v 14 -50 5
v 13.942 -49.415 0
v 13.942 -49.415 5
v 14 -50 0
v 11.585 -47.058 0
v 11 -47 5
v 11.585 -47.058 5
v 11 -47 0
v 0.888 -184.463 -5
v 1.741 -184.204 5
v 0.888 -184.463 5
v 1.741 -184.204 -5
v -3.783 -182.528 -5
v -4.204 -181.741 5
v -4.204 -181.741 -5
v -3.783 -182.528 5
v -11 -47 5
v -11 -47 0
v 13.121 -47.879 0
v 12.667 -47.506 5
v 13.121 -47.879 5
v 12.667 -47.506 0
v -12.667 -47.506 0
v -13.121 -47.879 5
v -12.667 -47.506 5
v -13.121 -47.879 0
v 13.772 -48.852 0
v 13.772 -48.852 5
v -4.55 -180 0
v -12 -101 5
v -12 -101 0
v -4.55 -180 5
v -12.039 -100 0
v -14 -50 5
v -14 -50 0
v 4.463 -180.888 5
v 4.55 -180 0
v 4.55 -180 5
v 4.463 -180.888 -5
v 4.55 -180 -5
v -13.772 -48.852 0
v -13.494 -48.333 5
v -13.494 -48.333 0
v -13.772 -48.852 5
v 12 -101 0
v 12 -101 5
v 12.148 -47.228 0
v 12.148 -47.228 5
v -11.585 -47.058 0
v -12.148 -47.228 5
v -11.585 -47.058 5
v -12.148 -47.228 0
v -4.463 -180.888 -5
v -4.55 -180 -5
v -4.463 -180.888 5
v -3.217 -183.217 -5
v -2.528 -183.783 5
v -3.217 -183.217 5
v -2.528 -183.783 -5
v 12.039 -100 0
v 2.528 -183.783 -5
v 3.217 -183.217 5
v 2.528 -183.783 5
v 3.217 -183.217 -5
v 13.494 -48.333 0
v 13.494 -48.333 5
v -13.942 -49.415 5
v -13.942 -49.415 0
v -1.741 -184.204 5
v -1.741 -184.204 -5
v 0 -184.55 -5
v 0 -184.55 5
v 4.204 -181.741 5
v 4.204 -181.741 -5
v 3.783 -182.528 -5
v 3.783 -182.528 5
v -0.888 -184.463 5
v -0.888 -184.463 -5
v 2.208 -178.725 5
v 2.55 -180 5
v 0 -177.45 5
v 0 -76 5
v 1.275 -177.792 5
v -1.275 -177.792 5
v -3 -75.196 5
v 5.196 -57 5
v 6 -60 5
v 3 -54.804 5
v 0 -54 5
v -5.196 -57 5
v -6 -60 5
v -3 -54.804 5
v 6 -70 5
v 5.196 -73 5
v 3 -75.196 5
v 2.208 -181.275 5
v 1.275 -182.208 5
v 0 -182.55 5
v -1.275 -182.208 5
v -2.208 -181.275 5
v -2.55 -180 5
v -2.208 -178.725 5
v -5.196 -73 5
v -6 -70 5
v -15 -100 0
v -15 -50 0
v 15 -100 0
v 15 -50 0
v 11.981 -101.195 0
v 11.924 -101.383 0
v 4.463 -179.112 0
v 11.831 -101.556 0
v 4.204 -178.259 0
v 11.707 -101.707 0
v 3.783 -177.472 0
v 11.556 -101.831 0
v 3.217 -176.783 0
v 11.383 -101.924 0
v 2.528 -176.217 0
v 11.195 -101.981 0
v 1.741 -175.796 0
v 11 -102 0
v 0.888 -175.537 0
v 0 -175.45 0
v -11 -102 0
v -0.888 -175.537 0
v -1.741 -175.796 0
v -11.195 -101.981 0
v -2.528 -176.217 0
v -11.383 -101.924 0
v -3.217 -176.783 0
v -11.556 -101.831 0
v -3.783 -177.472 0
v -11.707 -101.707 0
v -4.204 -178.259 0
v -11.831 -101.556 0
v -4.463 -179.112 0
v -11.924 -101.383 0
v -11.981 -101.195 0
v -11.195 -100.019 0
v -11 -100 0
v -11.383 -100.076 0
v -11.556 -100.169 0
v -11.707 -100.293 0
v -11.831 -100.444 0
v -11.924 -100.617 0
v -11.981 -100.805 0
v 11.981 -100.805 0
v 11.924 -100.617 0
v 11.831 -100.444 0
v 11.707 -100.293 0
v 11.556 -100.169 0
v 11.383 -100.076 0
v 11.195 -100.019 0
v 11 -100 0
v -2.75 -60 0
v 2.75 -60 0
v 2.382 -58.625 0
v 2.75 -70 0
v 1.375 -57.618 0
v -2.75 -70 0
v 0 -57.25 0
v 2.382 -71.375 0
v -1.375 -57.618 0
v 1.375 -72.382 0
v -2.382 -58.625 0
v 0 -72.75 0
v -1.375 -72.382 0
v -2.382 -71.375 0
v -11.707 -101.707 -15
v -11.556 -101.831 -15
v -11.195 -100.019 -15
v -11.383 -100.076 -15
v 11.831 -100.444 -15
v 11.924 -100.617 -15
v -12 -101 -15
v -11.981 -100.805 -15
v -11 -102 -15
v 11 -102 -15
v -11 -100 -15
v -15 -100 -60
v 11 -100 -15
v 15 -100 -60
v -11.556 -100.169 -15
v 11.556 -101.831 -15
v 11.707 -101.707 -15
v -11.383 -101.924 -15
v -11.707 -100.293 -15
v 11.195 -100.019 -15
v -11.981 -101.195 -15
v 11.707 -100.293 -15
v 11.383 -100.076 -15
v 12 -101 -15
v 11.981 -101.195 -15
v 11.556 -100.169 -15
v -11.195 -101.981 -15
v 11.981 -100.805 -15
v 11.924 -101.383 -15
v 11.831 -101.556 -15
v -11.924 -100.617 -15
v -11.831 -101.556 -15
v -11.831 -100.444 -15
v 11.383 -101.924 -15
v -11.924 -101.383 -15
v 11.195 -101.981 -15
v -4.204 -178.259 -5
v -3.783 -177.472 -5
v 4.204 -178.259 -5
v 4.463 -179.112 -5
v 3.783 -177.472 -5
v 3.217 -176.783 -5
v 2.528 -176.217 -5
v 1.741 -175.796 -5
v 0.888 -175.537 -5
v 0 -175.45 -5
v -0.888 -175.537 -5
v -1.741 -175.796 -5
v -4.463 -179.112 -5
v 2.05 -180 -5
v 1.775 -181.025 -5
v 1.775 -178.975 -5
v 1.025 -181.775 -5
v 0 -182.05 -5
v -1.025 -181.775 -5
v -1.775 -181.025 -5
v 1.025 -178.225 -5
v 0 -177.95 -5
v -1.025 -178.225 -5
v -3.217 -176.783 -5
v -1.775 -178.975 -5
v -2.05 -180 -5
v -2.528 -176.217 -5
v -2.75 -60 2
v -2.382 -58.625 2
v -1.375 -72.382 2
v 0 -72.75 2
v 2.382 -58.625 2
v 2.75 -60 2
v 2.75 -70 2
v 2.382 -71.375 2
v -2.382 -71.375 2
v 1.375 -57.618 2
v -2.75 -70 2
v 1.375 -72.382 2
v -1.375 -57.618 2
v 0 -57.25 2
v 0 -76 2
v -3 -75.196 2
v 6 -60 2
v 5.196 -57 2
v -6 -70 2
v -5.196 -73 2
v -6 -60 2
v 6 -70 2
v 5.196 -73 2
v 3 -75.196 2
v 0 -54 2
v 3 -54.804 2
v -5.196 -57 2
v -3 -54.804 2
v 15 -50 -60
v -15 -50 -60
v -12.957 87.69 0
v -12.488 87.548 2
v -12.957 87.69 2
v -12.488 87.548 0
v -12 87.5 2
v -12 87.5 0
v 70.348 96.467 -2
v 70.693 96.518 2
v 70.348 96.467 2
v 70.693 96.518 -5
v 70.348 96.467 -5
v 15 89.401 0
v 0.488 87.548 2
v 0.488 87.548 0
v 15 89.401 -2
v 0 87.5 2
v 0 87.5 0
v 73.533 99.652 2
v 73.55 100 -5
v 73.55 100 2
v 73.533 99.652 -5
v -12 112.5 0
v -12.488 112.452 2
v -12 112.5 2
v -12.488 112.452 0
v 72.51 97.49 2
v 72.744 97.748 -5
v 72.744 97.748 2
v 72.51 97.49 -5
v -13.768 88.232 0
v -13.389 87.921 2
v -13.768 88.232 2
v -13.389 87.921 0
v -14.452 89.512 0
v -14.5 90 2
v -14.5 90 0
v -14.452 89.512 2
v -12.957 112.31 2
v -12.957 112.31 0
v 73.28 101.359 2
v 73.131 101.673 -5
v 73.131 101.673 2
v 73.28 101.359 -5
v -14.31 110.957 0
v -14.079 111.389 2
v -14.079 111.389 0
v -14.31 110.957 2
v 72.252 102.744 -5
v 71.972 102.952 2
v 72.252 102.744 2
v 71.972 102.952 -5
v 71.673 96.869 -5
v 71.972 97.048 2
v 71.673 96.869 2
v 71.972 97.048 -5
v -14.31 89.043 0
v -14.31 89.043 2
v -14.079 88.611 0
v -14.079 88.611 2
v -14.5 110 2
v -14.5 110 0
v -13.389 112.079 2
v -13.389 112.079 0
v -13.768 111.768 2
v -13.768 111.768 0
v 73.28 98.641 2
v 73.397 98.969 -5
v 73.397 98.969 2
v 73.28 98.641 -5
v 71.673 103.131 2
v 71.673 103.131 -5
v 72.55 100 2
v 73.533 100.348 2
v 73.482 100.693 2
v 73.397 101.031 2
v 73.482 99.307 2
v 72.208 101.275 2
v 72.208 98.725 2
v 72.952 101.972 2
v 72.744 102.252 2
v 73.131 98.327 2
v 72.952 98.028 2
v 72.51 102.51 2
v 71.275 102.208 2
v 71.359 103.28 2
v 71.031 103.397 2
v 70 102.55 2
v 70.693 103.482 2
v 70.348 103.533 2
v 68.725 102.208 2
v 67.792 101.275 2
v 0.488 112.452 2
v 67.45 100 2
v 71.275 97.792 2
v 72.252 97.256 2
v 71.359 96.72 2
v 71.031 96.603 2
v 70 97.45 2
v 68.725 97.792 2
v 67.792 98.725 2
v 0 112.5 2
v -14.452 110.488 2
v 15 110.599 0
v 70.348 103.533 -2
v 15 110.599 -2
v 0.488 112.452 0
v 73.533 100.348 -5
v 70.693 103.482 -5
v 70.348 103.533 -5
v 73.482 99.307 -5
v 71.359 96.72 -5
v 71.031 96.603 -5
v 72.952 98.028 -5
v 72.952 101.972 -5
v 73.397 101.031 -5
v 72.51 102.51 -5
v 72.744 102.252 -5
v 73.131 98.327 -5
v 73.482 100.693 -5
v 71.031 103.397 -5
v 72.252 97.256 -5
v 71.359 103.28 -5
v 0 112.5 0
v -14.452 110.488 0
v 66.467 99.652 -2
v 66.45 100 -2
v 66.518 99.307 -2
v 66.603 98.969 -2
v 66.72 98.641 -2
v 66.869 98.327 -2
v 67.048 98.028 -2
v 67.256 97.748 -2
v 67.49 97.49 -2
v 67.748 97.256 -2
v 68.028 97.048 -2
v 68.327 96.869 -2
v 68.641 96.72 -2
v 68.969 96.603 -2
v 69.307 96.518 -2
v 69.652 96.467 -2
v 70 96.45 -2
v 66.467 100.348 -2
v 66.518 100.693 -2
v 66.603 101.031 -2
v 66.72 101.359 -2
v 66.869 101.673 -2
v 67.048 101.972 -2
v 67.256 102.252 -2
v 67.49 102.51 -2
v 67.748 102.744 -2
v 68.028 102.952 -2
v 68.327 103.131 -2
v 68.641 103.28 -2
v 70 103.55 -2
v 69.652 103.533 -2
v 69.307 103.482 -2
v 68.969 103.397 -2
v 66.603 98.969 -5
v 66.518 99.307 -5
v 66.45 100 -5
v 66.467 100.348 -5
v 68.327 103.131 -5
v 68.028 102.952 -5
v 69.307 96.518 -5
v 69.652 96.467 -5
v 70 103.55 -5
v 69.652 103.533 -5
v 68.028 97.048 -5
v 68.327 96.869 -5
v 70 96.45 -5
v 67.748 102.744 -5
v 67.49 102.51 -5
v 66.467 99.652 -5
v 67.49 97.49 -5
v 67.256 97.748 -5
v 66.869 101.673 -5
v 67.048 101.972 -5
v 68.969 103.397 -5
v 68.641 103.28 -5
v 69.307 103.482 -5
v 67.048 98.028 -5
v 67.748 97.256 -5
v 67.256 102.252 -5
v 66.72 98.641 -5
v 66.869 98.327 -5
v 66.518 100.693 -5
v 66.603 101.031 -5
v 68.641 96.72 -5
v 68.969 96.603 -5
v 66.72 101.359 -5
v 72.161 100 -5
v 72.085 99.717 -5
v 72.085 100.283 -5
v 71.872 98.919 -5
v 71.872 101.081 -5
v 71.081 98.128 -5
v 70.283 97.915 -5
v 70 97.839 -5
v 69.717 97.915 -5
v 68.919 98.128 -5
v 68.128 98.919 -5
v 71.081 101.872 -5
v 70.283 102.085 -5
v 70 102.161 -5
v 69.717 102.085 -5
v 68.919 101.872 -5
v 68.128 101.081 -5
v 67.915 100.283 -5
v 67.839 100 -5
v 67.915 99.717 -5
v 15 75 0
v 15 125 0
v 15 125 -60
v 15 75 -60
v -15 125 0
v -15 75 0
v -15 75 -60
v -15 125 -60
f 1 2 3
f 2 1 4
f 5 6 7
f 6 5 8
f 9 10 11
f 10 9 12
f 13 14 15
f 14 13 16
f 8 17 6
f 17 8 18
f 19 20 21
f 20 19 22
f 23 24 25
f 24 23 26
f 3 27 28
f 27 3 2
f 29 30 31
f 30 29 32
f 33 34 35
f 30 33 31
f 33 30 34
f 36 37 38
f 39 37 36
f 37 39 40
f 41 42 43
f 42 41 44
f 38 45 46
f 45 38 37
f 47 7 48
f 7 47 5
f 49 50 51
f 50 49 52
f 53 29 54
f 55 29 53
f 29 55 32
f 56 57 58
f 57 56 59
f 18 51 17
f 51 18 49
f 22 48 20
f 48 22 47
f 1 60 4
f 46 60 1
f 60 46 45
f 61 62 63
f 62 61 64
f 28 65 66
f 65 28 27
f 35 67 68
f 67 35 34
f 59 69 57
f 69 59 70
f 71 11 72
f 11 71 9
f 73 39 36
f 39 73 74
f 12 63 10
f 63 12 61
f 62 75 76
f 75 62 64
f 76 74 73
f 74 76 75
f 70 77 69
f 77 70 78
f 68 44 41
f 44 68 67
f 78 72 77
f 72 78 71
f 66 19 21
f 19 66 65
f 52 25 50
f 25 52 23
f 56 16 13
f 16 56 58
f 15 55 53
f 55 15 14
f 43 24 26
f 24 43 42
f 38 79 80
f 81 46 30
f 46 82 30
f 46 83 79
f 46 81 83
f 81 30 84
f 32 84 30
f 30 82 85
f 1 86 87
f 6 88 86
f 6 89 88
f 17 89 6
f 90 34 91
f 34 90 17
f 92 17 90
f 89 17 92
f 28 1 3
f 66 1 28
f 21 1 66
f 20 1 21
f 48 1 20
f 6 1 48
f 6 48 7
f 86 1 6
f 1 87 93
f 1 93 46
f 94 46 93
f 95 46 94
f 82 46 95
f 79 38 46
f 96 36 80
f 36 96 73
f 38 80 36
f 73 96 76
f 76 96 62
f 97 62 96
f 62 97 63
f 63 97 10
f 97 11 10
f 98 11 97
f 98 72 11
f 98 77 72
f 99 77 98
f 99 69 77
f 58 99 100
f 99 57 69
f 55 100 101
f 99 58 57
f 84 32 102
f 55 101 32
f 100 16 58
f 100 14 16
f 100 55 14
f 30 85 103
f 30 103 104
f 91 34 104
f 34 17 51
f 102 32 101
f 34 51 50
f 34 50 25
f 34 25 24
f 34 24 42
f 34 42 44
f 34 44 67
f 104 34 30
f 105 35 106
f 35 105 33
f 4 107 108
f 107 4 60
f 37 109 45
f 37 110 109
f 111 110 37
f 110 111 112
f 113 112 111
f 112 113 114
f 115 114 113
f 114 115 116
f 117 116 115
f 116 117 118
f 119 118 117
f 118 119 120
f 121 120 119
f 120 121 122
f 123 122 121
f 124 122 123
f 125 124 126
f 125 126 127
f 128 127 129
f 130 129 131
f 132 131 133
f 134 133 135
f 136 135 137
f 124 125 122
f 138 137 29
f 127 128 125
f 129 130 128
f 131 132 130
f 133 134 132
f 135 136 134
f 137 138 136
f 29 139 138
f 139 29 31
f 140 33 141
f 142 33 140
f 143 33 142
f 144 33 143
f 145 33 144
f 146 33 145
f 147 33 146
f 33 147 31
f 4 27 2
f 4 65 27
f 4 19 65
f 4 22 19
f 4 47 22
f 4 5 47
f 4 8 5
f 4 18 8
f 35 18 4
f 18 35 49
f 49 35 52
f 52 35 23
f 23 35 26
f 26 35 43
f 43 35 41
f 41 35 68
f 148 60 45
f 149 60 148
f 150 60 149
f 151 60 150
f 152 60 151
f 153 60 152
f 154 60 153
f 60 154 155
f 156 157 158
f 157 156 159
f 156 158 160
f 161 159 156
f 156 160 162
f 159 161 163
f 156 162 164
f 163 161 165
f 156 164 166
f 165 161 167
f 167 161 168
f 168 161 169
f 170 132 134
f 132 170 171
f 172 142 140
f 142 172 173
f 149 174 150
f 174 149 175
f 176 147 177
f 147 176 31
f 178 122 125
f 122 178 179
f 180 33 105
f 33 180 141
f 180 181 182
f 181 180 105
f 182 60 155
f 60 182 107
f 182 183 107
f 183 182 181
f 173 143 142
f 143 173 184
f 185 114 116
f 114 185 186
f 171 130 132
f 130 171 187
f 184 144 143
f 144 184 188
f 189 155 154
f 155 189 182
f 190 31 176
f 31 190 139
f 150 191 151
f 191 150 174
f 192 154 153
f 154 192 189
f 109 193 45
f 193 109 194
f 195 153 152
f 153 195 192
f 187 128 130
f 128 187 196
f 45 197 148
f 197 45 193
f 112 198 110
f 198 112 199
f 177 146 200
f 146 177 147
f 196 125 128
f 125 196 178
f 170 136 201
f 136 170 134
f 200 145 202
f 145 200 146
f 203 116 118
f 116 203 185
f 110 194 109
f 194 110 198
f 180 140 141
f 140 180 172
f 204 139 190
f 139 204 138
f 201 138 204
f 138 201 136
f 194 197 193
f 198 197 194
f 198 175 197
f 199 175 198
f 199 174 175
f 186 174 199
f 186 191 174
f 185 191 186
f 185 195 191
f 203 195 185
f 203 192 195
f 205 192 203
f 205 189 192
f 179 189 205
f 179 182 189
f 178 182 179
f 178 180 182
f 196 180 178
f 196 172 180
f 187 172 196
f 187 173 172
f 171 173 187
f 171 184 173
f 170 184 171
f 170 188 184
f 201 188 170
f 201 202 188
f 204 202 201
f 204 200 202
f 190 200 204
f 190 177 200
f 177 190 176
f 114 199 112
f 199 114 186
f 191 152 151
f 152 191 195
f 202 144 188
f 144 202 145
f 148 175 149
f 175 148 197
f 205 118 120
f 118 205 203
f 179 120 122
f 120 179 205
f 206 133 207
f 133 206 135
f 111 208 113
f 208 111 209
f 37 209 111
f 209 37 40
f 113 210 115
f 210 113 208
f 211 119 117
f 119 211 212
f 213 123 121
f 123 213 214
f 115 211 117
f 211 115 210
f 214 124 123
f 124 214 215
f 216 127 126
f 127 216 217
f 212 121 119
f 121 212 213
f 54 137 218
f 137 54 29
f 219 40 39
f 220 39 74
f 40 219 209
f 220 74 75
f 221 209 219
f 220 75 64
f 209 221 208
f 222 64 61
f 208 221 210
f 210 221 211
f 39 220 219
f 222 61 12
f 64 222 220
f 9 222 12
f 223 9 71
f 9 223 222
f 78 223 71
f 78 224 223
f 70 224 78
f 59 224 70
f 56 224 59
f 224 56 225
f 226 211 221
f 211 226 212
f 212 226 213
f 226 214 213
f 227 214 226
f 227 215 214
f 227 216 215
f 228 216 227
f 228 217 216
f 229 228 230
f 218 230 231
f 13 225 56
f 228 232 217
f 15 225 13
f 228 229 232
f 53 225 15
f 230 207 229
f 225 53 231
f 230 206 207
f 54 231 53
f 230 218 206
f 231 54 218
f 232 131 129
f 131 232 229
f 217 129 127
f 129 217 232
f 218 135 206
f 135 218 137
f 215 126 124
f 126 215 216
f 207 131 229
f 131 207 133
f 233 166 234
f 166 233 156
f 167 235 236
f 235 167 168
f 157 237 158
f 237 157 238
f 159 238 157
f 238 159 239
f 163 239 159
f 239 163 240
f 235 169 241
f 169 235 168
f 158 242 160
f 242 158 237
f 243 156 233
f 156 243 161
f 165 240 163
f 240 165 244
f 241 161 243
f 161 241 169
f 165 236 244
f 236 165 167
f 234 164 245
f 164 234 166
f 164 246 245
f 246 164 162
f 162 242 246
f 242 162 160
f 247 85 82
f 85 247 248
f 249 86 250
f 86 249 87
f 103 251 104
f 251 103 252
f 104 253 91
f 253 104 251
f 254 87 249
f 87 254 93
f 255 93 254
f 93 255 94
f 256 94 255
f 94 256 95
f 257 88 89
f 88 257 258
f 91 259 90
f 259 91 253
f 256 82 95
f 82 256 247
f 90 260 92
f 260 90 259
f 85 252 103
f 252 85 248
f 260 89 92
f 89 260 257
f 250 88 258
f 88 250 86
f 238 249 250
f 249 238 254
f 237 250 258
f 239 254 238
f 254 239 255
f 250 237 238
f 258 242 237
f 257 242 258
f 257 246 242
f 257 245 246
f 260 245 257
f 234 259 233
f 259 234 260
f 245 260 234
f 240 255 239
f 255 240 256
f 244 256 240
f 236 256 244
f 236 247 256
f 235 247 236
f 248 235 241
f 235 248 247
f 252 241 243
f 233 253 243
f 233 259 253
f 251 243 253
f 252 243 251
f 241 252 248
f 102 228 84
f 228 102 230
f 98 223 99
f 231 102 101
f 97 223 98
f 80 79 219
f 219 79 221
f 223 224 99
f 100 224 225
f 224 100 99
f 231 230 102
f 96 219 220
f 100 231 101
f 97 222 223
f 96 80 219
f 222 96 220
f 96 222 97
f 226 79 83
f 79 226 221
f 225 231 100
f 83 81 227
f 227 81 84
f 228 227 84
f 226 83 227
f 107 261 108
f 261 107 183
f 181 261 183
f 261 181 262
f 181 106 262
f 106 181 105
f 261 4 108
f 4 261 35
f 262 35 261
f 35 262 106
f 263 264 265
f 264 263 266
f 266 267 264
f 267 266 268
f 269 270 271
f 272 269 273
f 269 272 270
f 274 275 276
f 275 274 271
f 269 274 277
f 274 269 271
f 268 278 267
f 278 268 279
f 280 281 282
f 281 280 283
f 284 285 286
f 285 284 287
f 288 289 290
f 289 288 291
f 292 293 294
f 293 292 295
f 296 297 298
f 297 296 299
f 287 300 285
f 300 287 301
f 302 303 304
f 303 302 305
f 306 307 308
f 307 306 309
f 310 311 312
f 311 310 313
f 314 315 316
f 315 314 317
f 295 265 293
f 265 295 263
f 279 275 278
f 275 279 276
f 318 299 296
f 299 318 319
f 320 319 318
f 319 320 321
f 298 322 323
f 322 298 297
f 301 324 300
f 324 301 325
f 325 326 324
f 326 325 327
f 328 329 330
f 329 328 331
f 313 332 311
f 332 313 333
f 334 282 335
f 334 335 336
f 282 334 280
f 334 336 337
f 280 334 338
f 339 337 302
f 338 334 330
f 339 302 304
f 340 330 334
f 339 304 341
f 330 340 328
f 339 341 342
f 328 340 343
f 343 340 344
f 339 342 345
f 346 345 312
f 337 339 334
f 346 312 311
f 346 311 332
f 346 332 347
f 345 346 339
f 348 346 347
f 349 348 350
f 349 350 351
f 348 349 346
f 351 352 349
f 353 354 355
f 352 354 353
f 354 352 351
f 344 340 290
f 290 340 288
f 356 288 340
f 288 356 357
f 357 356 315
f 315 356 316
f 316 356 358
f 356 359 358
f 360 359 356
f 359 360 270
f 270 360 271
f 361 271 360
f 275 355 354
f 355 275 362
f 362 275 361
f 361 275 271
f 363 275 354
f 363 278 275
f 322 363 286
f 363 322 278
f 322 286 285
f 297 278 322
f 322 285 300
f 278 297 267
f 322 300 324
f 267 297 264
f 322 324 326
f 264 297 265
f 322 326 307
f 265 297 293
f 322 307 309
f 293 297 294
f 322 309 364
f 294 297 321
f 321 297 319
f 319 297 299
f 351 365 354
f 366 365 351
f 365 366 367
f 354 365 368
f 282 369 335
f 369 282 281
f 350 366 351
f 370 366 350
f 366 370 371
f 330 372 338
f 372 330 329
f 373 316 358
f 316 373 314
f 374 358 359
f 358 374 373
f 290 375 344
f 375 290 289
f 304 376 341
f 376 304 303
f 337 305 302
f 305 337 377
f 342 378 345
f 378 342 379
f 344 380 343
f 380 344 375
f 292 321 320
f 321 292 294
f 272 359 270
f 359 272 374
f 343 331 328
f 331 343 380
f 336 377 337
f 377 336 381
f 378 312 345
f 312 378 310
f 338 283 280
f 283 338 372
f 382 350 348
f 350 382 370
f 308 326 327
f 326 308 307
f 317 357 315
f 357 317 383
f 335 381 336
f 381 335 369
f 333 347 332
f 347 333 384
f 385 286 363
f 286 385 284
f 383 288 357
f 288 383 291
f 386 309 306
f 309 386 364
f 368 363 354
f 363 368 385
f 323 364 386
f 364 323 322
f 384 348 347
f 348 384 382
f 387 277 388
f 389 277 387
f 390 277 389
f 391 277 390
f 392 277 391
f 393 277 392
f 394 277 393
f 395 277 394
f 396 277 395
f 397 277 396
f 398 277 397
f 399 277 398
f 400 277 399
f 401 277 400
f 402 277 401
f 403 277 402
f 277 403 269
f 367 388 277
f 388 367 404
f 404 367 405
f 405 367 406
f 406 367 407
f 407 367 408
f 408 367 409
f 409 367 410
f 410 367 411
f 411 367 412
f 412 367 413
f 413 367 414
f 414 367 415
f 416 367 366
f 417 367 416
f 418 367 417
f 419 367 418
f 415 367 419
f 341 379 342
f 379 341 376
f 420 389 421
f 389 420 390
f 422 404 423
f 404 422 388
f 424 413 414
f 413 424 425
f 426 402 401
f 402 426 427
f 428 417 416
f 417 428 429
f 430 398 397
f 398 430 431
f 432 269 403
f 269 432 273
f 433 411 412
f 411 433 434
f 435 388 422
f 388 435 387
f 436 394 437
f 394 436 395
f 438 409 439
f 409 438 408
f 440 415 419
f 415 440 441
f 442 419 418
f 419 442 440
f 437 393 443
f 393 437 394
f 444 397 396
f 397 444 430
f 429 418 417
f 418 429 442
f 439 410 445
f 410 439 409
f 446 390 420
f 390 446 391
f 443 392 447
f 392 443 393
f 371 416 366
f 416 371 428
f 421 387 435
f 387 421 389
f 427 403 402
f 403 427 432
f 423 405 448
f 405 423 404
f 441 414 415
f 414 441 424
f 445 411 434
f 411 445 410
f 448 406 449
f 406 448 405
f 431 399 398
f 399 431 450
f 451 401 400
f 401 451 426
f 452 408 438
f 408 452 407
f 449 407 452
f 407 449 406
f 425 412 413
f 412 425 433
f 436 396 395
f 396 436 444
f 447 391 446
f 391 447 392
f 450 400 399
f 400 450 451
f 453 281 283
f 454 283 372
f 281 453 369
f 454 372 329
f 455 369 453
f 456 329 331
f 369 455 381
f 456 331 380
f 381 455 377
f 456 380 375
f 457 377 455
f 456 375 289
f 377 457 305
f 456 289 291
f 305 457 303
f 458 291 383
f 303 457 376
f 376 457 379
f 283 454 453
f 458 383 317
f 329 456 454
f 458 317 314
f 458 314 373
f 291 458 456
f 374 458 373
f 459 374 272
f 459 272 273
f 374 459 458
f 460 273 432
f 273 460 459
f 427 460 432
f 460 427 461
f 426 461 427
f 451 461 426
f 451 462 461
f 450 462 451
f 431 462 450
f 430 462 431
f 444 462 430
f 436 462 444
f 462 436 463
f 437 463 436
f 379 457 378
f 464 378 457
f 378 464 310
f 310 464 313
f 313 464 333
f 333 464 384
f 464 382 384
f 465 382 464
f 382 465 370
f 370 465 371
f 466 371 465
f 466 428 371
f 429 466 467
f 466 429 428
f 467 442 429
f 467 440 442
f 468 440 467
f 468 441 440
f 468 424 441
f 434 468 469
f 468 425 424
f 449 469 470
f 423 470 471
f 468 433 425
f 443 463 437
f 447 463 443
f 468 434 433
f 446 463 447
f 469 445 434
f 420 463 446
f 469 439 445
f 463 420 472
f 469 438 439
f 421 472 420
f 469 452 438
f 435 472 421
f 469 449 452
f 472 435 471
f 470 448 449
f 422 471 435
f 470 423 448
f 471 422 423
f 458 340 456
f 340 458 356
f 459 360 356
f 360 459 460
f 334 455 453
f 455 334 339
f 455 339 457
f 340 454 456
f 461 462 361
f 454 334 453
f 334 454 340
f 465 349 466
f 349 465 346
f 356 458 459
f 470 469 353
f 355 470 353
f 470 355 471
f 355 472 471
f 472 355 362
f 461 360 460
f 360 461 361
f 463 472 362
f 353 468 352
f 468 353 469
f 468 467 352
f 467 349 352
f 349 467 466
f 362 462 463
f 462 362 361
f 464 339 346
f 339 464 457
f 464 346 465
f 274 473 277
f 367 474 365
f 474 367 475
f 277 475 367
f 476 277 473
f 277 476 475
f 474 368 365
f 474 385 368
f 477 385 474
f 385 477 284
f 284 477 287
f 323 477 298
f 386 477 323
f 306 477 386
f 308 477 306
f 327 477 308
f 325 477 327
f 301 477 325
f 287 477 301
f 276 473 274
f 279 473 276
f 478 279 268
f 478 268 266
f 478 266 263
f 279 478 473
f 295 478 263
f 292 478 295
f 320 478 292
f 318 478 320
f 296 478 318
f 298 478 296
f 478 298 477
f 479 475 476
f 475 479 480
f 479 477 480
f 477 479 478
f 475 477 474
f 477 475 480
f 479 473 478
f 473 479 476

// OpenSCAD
echo(version=version());

bolt_diam = 5.5;
washer_diam = 12;
ptfe_diam = 4.1; //outer diam
poly = 32; // $fn value, higher is smoother
blue_x = 22; //top part width
hole_y = 20; //right part, rectangle hole
hole_x = 3;
hole_z = 15;
thi = 5; // left thickness, 4
thi2 = 4; // right thickness, 2
left_arm_dist = -80;
right_arm_dist = 80;

hexcut = 0;

case = 3; // 1 left, 2 right, 3 both, 4 print, 5 hex pattern
ptfe = 0;

module rod(x,y,diam,height,p=poly) {
	translate([x,y,-height/2])
		cylinder(h=height, d=diam, center=true, $fn=p);
}

module rod2(x,y,diam,diam2,height,p=poly) {
	translate([x,y,-height/2])
		cylinder(h=height, d1=diam, d2=diam2, center=true, $fn=p);
}

module left() {
	difference() { //diff
		//frame
		union() {
			translate([0,0,thi])
			hull(){
				rod(blue_x/2,50,6,thi, 32);
				rod(-blue_x/2,50,6,thi, 32);
				rod(blue_x/2,-1,2,thi, 32);
				rod(-blue_x/2,-1,2,thi, 32);
				
				rod(0,left_arm_dist,ptfe_diam+5,thi,32); //ptfe
			}
			translate([0,0,thi]) hull() {
				rod(blue_x/2,-1,2,20, 32);
				rod(-blue_x/2,-1,2,20, 32);
			}
			translate([0,0,thi])
				rod(0,left_arm_dist,ptfe_diam+5,thi*2,32); //ptfe
		}
		// holes:
		color("olive") union() {
			translate([0,0,5])
			hull() {
				rod(0,30,bolt_diam,10, 12);
				rod(0,40,bolt_diam,10, 12);
			}
			translate([0,0,12])
			hull() {
				rod(0,30,washer_diam,10, 12);
				rod(0,40,washer_diam,10, 12);
			}
			translate([0,0,thi])
				rod2(0,left_arm_dist,ptfe_diam,ptfe_diam+1,thi*2,12); //ptfe
			if(hexcut == 1) {
				hex(0,left_arm_dist*0.5,0,4,3,30);
				hex(0,12,0,8,6,30);
				//hex(0,-30,0,4,3,0);
				translate([0,0,-7]) rotate([90,0,0]) hex(0,0,0,5,4,30);
			}
		}
	}
	
}


module hex(x,y,z,hex_d=6,hex_s=5,r=0) {
	hex_x = hex_d * 0.8;
	hex_y = hex_d * 0.9;
	translate([x,y,z+15]) rotate([0,0,r]){
		rod(0,0,hex_s,30,6);
		rod(0,hex_y,hex_s,30,6);
		rod(0,-hex_y,hex_s,30,6);
		rod(hex_x,hex_y/2,hex_s,30,6);
		rod(hex_x,-hex_y/2,hex_s,30,6);
		rod(-hex_x,hex_y/2,hex_s,30,6);
		rod(-hex_x,-hex_y/2,hex_s,30,6);
	}
}


module right() {
	difference() {
		union() {
			//color("red") cube([hole_x, hole_y, hole_z], center=true);
			hull() {
				rod(0,-hole_y/2+hole_x/2,hole_x,hole_z,32);
				rod(0,hole_y/2-hole_x/2,hole_x,hole_z,32);
			}
			translate([0,0,2])
			hull() {
				//cube([blue_x, hole_y, 4], center=true);
				rod(-2,hole_y/2,5,thi2,p=32);
				rod(-2,-hole_y/2,5,thi2,p=32);
				rod(10,hole_y/2,5,thi2,p=32);
				rod(10,-hole_y/2,5,thi2,p=32);
				
				rod(right_arm_dist,0,ptfe_diam+3,thi2,p=64);
			}
			rod(right_arm_dist,0,ptfe_diam+3,thi2+1,p=64);
			}
		translate([0,0,thi2/2])
			color("red")
				rod2(right_arm_dist,0,ptfe_diam,ptfe_diam+1,thi2*2+1,p=12);
		if(hexcut == 1) {
			hex(15,0,0,7,5,0);
		}
		//translate([0,0,-7.5]) rotate([90,0,90]) hex(0,0,0,6,3,30);
	}
}

module topplastic(z) {
	color("blue",0.2)
	translate([-30/2,0,-z])
	cube([30,50,z], center=false);
}


if (case == 1) {
	left();
	//topplastic(60);
	if (ptfe) {
		color("red")
			translate([0,0,30])
			rod(0,-40,ptfe_diam,50,12); //ptfe
	}
}
else if (case == 2) {
	right();
	//translate([10,-25,0]) topplastic(60);
	if (ptfe) {
		translate([0,0,10])
		color("red")
			rod(40,0,ptfe_diam,30,p=12);
	}
}
else if (case == 3) {
	translate([0,-100,0]) {
		left();
		topplastic(60);
		if (ptfe) {
			color("red")
				translate([0,0,30])
				rod(0,-40,ptfe_diam,50,12); //ptfe
		}
	}
	translate([-10,100,0]) {
		right();
		translate([10,-25,0]) topplastic(60);
		if (ptfe) {
			translate([0,0,10])
			color("red")
				rod(40,0,ptfe_diam,30,p=12);
		}
	}
}
else if (case == 4) {
	translate([0,0,thi])
		rotate([0,180,90])
			translate([0,0,0]) left();
	translate([40,-30,2])
		rotate([0,180,0])
			right();
}
else if (case == 5) {
	hex(0,0,0);
}
